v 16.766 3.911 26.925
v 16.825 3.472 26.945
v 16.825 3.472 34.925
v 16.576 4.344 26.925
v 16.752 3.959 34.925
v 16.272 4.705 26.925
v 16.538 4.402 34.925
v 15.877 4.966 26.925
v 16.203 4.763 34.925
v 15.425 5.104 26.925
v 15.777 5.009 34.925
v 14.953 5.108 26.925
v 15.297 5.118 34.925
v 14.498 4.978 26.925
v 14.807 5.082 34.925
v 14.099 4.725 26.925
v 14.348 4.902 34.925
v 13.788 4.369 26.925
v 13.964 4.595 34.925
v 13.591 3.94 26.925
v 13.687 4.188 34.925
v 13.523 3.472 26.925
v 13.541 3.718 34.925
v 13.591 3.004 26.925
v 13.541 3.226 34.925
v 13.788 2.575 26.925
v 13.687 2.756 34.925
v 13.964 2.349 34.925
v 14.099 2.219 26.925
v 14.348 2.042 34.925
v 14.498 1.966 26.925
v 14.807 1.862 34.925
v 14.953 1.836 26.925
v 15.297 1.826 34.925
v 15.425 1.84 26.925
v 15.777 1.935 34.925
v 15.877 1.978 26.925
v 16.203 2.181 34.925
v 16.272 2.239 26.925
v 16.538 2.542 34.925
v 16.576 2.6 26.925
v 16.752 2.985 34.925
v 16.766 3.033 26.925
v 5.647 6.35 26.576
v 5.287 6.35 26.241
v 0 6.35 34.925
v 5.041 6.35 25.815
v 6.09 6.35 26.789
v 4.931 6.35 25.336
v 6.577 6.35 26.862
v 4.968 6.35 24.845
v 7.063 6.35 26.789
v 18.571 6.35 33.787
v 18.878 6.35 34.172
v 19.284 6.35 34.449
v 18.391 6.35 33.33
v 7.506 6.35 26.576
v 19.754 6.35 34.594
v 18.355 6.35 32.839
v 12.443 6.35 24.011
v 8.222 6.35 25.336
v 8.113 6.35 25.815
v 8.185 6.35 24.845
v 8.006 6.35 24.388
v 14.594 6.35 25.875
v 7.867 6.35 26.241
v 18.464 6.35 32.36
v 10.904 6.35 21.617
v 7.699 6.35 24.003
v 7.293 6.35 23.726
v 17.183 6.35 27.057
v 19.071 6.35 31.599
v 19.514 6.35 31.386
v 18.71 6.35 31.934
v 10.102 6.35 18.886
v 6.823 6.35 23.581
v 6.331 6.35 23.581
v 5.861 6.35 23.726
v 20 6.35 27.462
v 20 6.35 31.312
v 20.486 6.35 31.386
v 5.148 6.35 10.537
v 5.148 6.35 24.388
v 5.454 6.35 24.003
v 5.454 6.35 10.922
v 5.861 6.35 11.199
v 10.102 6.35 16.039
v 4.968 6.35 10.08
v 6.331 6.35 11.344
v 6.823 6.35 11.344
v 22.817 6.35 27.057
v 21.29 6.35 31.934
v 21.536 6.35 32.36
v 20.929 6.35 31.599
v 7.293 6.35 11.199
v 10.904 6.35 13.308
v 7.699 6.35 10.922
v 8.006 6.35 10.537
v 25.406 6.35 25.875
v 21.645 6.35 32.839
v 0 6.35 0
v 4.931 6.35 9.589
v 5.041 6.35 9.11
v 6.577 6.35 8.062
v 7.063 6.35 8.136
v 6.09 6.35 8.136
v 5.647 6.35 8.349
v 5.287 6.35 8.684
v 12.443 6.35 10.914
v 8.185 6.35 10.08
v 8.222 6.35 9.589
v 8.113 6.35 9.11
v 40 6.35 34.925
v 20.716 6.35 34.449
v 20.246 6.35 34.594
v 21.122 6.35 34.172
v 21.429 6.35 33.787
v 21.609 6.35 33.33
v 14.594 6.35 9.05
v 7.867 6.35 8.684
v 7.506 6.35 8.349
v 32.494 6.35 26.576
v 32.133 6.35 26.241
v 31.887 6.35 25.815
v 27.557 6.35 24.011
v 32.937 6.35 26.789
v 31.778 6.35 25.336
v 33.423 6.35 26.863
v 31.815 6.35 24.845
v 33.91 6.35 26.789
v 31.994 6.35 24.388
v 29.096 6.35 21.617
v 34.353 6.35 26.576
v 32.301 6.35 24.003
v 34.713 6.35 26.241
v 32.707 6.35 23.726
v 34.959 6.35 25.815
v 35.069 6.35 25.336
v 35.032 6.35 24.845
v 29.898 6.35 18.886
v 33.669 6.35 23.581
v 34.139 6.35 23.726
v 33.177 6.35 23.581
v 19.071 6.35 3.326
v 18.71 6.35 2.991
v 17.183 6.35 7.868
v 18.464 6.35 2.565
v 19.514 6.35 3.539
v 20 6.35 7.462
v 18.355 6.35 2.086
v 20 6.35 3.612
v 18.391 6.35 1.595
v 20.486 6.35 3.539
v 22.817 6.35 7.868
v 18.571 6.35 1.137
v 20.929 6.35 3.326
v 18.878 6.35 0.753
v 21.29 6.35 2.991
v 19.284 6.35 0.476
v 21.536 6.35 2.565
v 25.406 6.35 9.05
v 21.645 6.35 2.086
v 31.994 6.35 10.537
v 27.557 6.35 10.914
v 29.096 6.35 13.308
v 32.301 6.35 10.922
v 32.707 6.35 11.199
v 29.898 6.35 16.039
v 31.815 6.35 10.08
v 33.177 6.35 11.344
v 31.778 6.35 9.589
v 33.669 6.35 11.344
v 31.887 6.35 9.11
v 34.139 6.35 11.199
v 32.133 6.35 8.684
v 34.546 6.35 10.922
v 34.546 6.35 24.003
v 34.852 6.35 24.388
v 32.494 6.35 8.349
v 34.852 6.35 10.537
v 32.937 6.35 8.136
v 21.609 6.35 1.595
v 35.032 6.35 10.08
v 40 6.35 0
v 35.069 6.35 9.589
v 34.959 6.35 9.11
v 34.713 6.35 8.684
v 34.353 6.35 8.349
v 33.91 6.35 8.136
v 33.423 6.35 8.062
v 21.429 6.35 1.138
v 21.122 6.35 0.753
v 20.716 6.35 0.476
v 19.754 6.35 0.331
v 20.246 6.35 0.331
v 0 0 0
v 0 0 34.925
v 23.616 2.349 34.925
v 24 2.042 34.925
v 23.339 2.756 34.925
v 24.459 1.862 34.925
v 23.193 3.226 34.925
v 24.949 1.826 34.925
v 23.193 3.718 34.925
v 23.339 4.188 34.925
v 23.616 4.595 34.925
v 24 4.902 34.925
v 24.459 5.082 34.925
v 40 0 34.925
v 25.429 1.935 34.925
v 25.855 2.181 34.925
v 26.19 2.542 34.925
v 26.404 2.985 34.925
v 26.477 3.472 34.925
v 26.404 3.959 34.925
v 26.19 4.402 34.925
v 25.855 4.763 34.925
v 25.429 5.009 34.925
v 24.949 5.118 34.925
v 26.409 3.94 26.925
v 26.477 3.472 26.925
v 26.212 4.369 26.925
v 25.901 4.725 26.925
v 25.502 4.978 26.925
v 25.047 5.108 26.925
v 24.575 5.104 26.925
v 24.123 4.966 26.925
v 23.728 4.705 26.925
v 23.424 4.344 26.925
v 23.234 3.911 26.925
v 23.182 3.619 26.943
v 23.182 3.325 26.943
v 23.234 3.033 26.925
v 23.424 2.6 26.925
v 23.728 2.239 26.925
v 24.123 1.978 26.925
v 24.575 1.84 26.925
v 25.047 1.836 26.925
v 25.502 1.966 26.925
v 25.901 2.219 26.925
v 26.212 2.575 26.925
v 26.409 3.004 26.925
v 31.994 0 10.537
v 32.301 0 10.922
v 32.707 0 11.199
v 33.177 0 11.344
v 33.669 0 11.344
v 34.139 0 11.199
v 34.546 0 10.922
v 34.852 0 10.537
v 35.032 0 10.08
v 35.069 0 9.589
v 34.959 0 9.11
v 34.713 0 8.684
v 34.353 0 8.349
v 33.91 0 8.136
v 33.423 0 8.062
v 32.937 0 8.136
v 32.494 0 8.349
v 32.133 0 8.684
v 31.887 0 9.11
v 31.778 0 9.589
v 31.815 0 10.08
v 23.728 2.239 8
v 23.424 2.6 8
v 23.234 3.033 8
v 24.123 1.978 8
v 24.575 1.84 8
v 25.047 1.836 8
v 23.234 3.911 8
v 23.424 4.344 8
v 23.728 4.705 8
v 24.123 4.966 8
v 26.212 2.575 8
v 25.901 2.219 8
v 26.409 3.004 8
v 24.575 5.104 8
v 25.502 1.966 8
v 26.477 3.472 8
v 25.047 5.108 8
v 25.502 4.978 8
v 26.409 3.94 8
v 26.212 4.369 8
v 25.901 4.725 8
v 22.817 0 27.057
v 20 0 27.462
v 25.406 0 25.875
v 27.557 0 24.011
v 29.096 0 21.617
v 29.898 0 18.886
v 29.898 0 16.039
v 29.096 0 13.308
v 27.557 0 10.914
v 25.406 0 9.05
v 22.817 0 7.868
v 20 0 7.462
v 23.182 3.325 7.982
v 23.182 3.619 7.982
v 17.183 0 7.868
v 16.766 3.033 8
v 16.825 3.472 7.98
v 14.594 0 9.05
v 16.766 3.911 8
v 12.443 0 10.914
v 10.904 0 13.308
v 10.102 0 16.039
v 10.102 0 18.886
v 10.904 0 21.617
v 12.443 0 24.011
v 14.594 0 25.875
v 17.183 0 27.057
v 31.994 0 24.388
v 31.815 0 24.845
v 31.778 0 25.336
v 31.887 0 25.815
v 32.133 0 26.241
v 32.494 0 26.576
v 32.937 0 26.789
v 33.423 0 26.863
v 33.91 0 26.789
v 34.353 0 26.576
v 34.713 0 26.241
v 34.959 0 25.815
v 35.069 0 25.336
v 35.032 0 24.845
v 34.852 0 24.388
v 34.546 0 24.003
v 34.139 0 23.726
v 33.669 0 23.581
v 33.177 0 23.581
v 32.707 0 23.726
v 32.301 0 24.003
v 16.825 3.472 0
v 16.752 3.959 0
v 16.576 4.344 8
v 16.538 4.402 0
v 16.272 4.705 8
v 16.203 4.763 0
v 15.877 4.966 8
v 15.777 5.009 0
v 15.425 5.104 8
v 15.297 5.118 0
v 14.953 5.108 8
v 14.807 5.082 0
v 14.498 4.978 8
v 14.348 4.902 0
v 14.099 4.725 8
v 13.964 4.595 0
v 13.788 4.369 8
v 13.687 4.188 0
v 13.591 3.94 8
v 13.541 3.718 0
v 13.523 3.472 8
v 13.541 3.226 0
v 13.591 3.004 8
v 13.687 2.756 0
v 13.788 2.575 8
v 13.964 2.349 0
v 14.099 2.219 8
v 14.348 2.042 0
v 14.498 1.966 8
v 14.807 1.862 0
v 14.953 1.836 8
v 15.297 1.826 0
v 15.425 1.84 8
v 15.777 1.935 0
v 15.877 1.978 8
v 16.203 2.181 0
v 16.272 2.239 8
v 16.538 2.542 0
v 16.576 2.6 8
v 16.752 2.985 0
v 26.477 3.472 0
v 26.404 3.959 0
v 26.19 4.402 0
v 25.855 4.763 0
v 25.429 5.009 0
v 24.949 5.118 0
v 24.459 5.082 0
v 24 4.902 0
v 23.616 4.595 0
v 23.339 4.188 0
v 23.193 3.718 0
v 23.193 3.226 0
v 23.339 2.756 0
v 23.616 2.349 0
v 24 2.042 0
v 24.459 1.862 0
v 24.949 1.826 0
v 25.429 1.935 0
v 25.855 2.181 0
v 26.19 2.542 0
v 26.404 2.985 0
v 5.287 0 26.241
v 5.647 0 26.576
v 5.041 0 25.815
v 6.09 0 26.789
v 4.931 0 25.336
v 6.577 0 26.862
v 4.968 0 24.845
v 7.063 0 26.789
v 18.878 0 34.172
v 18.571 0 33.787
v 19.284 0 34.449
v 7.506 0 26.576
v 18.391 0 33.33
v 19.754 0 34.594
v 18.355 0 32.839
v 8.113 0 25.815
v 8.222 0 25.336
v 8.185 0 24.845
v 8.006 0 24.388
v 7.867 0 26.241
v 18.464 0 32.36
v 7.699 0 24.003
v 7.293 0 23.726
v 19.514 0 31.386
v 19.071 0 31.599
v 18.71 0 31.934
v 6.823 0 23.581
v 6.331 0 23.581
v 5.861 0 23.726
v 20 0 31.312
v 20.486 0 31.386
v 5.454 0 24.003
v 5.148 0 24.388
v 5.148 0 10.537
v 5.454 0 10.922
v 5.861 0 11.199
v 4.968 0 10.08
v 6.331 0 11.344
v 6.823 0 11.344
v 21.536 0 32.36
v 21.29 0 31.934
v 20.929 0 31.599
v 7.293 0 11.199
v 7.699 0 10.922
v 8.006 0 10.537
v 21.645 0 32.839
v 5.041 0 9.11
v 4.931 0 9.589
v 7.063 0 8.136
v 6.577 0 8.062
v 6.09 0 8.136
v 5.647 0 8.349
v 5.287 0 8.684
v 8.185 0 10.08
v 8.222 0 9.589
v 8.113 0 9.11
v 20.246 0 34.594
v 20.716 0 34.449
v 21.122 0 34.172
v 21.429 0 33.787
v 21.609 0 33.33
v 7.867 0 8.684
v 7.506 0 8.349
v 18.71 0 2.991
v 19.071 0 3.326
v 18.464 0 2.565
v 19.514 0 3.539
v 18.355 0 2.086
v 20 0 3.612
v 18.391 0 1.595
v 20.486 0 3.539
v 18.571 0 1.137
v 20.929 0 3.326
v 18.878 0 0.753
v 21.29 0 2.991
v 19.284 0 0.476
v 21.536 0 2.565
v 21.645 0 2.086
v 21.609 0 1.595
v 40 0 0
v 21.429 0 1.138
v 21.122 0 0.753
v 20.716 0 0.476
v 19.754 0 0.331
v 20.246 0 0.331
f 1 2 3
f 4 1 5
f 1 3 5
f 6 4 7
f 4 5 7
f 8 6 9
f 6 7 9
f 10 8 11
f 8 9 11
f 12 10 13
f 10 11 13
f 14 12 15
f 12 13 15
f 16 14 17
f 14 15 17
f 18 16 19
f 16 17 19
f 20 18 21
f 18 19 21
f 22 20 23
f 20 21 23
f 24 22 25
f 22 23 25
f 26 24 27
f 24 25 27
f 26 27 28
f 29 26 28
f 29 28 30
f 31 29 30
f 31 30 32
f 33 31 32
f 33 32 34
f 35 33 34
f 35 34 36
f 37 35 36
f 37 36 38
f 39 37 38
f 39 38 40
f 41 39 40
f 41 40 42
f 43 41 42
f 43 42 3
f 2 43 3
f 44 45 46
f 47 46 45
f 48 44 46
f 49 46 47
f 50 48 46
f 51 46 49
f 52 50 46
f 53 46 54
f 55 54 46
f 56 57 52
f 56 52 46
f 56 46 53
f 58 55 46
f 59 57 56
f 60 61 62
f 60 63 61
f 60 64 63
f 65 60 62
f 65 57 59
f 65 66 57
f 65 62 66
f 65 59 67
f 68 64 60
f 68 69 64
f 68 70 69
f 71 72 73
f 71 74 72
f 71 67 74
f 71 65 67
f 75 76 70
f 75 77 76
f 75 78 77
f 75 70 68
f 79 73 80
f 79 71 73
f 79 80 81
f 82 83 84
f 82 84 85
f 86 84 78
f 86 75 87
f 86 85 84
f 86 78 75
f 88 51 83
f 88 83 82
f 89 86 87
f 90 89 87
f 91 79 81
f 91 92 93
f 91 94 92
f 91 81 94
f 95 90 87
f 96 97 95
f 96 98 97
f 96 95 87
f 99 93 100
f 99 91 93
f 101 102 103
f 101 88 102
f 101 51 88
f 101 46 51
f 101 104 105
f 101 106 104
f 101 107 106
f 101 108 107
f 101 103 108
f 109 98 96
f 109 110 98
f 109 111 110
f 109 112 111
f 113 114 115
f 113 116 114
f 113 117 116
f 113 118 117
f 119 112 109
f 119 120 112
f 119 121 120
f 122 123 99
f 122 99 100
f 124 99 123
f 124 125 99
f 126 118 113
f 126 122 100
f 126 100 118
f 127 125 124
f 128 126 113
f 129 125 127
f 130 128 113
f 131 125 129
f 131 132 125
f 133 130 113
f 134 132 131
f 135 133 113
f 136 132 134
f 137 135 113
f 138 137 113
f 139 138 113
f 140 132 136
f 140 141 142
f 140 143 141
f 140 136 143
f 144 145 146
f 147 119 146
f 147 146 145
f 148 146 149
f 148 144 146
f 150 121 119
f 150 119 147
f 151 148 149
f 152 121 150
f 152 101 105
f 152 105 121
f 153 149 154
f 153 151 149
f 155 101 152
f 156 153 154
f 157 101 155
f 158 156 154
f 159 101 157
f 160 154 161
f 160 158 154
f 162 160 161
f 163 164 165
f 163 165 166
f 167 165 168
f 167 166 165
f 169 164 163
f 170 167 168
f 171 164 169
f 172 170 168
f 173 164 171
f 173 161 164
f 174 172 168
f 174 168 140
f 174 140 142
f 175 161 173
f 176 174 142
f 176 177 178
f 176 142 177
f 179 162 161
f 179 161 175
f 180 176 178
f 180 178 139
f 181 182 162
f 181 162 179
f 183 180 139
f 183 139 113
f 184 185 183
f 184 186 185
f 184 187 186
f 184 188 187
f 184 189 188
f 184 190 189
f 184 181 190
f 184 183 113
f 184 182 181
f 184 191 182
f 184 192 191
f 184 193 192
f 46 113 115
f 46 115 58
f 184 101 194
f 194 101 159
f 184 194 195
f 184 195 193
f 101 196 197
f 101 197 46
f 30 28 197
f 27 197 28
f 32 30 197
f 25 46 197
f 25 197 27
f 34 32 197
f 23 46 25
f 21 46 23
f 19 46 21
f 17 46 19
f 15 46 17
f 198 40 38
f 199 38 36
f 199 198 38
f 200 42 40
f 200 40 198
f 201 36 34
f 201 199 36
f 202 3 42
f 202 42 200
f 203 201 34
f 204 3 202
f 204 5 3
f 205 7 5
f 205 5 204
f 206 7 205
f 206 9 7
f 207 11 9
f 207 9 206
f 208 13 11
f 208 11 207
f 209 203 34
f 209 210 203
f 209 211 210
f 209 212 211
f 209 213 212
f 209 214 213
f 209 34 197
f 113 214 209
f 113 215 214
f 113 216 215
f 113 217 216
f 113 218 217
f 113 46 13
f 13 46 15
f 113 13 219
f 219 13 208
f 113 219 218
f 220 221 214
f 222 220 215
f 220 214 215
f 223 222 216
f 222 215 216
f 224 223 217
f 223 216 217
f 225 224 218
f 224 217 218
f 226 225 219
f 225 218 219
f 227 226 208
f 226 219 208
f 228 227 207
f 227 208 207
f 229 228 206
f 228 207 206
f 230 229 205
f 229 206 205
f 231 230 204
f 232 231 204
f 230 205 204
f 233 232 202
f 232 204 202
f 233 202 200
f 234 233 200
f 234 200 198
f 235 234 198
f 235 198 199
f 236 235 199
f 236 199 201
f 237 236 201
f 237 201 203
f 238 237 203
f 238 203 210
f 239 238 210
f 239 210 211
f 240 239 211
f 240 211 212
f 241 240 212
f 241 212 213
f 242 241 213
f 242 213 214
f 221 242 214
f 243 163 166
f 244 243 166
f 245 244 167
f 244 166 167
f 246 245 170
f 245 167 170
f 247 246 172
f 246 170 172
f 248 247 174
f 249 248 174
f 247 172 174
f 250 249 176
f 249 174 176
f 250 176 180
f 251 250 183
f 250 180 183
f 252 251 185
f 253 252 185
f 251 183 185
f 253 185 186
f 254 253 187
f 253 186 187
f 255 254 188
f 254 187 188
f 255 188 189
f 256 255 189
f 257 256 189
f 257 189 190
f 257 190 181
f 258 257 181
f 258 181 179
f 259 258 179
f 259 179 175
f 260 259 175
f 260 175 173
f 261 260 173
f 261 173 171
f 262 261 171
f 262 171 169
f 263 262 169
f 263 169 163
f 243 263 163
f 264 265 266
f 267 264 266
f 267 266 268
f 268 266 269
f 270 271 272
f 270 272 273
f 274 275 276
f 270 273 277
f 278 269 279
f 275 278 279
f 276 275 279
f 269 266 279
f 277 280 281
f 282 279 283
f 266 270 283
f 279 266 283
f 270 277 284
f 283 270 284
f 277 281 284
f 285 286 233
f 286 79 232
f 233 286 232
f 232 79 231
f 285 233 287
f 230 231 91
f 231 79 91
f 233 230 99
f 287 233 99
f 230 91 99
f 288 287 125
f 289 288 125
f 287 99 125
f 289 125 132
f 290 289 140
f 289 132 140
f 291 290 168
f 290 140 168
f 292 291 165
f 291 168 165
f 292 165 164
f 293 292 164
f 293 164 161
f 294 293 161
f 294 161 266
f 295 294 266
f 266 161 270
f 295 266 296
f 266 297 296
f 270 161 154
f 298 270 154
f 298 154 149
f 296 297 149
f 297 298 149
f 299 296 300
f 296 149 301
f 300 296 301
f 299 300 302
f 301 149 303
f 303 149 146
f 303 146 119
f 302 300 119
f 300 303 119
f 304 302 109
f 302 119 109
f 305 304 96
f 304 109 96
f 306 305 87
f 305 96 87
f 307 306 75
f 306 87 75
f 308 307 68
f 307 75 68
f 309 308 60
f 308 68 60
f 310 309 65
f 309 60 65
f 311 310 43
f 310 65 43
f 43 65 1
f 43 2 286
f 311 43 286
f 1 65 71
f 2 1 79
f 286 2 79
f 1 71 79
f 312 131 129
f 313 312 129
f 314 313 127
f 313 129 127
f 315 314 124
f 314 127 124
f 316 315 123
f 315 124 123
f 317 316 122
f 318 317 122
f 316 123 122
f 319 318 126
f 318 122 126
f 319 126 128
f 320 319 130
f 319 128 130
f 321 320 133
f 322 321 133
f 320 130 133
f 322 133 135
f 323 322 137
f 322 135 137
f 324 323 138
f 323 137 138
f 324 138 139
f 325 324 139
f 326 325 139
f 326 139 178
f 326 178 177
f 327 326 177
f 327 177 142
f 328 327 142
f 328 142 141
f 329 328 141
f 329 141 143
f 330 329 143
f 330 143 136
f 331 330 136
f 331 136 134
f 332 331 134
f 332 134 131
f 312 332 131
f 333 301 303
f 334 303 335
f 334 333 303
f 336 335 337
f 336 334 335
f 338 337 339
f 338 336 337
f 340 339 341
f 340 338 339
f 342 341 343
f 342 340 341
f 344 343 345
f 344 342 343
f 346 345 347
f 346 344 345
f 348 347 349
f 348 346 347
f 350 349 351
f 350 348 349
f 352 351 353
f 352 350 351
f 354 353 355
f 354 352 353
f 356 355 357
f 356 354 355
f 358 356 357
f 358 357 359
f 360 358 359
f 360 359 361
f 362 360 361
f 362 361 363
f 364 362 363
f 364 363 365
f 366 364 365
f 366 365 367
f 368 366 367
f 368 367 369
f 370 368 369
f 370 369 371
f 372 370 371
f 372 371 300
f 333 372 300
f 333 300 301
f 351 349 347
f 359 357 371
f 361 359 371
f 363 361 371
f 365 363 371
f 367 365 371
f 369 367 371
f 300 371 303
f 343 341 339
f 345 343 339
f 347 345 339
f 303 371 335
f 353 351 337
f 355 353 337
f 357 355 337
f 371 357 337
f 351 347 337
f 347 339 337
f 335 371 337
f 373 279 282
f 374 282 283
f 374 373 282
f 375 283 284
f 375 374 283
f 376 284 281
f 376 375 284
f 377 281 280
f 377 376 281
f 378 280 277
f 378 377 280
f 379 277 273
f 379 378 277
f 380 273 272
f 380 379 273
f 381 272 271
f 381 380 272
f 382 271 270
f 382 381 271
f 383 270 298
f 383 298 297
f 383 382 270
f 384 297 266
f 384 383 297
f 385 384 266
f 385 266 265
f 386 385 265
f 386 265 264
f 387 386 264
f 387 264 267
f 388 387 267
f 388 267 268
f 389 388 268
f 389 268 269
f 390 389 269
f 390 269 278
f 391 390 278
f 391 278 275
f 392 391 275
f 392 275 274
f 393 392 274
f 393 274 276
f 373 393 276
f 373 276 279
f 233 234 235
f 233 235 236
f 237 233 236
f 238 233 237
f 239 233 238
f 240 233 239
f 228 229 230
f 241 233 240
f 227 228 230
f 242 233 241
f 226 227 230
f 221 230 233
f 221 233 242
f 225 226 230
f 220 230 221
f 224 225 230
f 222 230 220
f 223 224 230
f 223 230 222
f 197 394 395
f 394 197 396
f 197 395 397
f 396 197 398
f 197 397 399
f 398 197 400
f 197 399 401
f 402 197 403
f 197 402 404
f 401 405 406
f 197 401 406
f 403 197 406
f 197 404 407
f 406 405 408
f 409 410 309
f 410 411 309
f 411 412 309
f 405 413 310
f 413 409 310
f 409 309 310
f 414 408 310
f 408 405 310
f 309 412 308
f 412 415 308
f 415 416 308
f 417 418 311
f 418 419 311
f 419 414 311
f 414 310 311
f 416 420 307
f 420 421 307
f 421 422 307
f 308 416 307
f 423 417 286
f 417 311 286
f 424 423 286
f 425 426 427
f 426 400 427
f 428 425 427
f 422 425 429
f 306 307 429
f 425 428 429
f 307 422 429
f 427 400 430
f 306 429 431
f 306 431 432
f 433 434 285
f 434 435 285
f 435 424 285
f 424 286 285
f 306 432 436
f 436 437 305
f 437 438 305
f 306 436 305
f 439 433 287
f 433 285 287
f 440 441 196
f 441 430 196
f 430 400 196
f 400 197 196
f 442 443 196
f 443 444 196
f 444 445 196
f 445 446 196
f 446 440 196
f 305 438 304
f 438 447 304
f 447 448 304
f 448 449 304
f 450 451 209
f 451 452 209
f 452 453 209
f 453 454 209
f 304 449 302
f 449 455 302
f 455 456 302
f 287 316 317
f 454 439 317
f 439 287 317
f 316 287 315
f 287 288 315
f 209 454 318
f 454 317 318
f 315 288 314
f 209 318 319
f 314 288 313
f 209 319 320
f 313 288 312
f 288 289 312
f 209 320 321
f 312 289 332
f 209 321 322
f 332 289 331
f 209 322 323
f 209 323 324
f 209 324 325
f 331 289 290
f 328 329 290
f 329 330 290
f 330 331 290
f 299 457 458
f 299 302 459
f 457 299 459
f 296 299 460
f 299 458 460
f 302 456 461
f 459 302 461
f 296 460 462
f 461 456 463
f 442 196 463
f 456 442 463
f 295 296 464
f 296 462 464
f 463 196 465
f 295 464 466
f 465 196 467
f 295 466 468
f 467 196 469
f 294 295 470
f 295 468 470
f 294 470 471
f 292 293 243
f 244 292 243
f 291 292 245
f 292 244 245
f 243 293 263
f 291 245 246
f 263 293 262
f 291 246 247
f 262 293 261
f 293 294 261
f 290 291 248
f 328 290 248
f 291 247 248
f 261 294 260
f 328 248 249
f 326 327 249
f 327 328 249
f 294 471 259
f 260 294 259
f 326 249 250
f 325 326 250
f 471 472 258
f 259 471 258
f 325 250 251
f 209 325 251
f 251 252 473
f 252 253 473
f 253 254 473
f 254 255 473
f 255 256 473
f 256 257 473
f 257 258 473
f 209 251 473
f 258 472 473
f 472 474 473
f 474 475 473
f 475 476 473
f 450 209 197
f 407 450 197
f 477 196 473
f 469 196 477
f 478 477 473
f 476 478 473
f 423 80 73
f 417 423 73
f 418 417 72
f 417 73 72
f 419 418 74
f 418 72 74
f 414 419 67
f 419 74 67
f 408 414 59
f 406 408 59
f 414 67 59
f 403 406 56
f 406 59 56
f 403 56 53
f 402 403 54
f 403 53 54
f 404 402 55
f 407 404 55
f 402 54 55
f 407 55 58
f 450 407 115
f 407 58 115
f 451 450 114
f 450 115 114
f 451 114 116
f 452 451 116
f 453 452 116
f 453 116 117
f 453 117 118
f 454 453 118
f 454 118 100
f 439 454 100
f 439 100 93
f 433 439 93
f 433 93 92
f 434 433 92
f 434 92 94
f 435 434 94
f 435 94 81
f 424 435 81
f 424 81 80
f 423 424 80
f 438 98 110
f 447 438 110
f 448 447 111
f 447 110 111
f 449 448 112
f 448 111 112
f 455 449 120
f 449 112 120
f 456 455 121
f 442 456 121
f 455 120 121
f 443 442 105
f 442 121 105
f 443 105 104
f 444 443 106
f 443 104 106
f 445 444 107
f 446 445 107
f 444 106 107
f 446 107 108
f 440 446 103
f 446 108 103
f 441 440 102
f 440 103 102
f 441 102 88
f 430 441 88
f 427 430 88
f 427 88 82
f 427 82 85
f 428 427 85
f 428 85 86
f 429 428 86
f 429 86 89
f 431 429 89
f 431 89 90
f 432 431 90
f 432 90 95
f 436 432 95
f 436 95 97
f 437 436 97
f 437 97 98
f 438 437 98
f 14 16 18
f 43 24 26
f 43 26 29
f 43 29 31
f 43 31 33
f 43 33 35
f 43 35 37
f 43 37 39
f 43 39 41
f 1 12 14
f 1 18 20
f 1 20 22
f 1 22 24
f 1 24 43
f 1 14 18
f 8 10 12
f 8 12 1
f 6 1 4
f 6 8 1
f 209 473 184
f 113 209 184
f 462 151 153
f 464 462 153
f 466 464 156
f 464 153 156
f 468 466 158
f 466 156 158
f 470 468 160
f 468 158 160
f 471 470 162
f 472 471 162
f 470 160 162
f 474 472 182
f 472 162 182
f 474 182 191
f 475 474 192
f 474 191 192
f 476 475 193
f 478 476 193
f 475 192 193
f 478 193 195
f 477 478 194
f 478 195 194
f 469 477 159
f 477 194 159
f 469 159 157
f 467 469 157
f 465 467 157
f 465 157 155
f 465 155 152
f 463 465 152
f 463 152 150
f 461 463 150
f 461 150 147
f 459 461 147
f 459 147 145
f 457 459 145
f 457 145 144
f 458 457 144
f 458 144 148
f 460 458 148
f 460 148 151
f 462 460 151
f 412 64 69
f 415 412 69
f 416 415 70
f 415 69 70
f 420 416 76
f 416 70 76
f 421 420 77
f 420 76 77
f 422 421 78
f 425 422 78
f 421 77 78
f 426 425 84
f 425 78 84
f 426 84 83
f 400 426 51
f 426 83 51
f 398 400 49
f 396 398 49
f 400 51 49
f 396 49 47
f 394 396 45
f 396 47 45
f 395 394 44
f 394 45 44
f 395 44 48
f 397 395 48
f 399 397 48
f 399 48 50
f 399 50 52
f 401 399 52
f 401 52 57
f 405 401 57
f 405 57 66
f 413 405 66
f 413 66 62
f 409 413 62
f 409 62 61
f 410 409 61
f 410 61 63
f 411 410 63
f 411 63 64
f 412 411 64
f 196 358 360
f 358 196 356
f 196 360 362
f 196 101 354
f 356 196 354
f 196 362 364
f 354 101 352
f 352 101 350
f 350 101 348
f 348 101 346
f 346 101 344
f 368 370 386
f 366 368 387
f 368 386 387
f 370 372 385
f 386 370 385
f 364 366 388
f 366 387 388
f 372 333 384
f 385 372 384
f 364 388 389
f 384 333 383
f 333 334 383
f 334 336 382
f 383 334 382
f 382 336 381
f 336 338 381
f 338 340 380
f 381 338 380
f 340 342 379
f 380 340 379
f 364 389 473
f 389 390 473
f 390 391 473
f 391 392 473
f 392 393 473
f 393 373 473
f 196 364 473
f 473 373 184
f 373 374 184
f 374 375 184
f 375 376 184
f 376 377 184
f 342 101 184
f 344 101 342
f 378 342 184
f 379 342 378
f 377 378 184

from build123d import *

# Parameters (mm, degrees)
SKETCH1_W           = 40
SKETCH1_H           = 6.35
BOSS_EXTRUDE1_DEPTH = 34.925
SKETCH2_R           = 1.651
CUT_EXTRUDE1_DEPTH  = 8
SKETCH3_R           = 10
CUT_EXTRUDE2_DEPTH  = 54.479698251
SKETCH4_R           = 1.65
CUT_EXTRUDE3_DEPTH  = 54.479698328
CIRPATTERN1_COUNT   = 6


with BuildPart() as part:
    # Sketch1 → Boss-Extrude1 (new body)
    with BuildSketch(Plane.XY):
        with Locations((20, 3.175)):
            Rectangle(SKETCH1_W, SKETCH1_H)
    extrude(amount=BOSS_EXTRUDE1_DEPTH)

    # Sketch2 → Cut-Extrude1 (cut)
    with BuildSketch(Plane.XY.offset(34.925)):
        with Locations((15.174, 3.472079932)):
            Circle(SKETCH2_R)
        with Locations((24.826, 3.472079932)):
            Circle(SKETCH2_R)
    cut_extrude1 = extrude(amount=-CUT_EXTRUDE1_DEPTH, mode=Mode.SUBTRACT)

    # Mirror1: Cut-Extrude1 across plane
    add(cut_extrude1.mirror(Plane.XY.offset(17.4625)), mode=Mode.SUBTRACT)

    # Sketch3 → Cut-Extrude2 (cut, through all)
    with BuildSketch(Plane(origin=(0, 6.35, 0), x_dir=(1, 0, 0), z_dir=(0, 1, 0))):
        with Locations(Location((20, -17.4625, 0), (0, 0, 270))):
            Circle(SKETCH3_R)
    extrude(amount=-CUT_EXTRUDE2_DEPTH, mode=Mode.SUBTRACT)

    # Sketch4 → Cut-Extrude3 (cut, through all)
    with BuildSketch(Plane(origin=(0, 6.35, 0), x_dir=(1, 0, 0), z_dir=(0, 1, 0))):
        with Locations(Location((20, -1.9625, 0), (0, 0, 270))):
            Circle(SKETCH4_R)
    cut_extrude3 = extrude(amount=-CUT_EXTRUDE3_DEPTH, mode=Mode.SUBTRACT)

    # CirPattern1: Cut-Extrude3 ×6 about axis
    cirpattern1_axis = Axis((20, 0, 17.4625), (0, 1, 0))
    for i in range(1, CIRPATTERN1_COUNT):
        add(cut_extrude3.rotate(cirpattern1_axis, i * 360 / CIRPATTERN1_COUNT), mode=Mode.SUBTRACT)


solid = part.part
